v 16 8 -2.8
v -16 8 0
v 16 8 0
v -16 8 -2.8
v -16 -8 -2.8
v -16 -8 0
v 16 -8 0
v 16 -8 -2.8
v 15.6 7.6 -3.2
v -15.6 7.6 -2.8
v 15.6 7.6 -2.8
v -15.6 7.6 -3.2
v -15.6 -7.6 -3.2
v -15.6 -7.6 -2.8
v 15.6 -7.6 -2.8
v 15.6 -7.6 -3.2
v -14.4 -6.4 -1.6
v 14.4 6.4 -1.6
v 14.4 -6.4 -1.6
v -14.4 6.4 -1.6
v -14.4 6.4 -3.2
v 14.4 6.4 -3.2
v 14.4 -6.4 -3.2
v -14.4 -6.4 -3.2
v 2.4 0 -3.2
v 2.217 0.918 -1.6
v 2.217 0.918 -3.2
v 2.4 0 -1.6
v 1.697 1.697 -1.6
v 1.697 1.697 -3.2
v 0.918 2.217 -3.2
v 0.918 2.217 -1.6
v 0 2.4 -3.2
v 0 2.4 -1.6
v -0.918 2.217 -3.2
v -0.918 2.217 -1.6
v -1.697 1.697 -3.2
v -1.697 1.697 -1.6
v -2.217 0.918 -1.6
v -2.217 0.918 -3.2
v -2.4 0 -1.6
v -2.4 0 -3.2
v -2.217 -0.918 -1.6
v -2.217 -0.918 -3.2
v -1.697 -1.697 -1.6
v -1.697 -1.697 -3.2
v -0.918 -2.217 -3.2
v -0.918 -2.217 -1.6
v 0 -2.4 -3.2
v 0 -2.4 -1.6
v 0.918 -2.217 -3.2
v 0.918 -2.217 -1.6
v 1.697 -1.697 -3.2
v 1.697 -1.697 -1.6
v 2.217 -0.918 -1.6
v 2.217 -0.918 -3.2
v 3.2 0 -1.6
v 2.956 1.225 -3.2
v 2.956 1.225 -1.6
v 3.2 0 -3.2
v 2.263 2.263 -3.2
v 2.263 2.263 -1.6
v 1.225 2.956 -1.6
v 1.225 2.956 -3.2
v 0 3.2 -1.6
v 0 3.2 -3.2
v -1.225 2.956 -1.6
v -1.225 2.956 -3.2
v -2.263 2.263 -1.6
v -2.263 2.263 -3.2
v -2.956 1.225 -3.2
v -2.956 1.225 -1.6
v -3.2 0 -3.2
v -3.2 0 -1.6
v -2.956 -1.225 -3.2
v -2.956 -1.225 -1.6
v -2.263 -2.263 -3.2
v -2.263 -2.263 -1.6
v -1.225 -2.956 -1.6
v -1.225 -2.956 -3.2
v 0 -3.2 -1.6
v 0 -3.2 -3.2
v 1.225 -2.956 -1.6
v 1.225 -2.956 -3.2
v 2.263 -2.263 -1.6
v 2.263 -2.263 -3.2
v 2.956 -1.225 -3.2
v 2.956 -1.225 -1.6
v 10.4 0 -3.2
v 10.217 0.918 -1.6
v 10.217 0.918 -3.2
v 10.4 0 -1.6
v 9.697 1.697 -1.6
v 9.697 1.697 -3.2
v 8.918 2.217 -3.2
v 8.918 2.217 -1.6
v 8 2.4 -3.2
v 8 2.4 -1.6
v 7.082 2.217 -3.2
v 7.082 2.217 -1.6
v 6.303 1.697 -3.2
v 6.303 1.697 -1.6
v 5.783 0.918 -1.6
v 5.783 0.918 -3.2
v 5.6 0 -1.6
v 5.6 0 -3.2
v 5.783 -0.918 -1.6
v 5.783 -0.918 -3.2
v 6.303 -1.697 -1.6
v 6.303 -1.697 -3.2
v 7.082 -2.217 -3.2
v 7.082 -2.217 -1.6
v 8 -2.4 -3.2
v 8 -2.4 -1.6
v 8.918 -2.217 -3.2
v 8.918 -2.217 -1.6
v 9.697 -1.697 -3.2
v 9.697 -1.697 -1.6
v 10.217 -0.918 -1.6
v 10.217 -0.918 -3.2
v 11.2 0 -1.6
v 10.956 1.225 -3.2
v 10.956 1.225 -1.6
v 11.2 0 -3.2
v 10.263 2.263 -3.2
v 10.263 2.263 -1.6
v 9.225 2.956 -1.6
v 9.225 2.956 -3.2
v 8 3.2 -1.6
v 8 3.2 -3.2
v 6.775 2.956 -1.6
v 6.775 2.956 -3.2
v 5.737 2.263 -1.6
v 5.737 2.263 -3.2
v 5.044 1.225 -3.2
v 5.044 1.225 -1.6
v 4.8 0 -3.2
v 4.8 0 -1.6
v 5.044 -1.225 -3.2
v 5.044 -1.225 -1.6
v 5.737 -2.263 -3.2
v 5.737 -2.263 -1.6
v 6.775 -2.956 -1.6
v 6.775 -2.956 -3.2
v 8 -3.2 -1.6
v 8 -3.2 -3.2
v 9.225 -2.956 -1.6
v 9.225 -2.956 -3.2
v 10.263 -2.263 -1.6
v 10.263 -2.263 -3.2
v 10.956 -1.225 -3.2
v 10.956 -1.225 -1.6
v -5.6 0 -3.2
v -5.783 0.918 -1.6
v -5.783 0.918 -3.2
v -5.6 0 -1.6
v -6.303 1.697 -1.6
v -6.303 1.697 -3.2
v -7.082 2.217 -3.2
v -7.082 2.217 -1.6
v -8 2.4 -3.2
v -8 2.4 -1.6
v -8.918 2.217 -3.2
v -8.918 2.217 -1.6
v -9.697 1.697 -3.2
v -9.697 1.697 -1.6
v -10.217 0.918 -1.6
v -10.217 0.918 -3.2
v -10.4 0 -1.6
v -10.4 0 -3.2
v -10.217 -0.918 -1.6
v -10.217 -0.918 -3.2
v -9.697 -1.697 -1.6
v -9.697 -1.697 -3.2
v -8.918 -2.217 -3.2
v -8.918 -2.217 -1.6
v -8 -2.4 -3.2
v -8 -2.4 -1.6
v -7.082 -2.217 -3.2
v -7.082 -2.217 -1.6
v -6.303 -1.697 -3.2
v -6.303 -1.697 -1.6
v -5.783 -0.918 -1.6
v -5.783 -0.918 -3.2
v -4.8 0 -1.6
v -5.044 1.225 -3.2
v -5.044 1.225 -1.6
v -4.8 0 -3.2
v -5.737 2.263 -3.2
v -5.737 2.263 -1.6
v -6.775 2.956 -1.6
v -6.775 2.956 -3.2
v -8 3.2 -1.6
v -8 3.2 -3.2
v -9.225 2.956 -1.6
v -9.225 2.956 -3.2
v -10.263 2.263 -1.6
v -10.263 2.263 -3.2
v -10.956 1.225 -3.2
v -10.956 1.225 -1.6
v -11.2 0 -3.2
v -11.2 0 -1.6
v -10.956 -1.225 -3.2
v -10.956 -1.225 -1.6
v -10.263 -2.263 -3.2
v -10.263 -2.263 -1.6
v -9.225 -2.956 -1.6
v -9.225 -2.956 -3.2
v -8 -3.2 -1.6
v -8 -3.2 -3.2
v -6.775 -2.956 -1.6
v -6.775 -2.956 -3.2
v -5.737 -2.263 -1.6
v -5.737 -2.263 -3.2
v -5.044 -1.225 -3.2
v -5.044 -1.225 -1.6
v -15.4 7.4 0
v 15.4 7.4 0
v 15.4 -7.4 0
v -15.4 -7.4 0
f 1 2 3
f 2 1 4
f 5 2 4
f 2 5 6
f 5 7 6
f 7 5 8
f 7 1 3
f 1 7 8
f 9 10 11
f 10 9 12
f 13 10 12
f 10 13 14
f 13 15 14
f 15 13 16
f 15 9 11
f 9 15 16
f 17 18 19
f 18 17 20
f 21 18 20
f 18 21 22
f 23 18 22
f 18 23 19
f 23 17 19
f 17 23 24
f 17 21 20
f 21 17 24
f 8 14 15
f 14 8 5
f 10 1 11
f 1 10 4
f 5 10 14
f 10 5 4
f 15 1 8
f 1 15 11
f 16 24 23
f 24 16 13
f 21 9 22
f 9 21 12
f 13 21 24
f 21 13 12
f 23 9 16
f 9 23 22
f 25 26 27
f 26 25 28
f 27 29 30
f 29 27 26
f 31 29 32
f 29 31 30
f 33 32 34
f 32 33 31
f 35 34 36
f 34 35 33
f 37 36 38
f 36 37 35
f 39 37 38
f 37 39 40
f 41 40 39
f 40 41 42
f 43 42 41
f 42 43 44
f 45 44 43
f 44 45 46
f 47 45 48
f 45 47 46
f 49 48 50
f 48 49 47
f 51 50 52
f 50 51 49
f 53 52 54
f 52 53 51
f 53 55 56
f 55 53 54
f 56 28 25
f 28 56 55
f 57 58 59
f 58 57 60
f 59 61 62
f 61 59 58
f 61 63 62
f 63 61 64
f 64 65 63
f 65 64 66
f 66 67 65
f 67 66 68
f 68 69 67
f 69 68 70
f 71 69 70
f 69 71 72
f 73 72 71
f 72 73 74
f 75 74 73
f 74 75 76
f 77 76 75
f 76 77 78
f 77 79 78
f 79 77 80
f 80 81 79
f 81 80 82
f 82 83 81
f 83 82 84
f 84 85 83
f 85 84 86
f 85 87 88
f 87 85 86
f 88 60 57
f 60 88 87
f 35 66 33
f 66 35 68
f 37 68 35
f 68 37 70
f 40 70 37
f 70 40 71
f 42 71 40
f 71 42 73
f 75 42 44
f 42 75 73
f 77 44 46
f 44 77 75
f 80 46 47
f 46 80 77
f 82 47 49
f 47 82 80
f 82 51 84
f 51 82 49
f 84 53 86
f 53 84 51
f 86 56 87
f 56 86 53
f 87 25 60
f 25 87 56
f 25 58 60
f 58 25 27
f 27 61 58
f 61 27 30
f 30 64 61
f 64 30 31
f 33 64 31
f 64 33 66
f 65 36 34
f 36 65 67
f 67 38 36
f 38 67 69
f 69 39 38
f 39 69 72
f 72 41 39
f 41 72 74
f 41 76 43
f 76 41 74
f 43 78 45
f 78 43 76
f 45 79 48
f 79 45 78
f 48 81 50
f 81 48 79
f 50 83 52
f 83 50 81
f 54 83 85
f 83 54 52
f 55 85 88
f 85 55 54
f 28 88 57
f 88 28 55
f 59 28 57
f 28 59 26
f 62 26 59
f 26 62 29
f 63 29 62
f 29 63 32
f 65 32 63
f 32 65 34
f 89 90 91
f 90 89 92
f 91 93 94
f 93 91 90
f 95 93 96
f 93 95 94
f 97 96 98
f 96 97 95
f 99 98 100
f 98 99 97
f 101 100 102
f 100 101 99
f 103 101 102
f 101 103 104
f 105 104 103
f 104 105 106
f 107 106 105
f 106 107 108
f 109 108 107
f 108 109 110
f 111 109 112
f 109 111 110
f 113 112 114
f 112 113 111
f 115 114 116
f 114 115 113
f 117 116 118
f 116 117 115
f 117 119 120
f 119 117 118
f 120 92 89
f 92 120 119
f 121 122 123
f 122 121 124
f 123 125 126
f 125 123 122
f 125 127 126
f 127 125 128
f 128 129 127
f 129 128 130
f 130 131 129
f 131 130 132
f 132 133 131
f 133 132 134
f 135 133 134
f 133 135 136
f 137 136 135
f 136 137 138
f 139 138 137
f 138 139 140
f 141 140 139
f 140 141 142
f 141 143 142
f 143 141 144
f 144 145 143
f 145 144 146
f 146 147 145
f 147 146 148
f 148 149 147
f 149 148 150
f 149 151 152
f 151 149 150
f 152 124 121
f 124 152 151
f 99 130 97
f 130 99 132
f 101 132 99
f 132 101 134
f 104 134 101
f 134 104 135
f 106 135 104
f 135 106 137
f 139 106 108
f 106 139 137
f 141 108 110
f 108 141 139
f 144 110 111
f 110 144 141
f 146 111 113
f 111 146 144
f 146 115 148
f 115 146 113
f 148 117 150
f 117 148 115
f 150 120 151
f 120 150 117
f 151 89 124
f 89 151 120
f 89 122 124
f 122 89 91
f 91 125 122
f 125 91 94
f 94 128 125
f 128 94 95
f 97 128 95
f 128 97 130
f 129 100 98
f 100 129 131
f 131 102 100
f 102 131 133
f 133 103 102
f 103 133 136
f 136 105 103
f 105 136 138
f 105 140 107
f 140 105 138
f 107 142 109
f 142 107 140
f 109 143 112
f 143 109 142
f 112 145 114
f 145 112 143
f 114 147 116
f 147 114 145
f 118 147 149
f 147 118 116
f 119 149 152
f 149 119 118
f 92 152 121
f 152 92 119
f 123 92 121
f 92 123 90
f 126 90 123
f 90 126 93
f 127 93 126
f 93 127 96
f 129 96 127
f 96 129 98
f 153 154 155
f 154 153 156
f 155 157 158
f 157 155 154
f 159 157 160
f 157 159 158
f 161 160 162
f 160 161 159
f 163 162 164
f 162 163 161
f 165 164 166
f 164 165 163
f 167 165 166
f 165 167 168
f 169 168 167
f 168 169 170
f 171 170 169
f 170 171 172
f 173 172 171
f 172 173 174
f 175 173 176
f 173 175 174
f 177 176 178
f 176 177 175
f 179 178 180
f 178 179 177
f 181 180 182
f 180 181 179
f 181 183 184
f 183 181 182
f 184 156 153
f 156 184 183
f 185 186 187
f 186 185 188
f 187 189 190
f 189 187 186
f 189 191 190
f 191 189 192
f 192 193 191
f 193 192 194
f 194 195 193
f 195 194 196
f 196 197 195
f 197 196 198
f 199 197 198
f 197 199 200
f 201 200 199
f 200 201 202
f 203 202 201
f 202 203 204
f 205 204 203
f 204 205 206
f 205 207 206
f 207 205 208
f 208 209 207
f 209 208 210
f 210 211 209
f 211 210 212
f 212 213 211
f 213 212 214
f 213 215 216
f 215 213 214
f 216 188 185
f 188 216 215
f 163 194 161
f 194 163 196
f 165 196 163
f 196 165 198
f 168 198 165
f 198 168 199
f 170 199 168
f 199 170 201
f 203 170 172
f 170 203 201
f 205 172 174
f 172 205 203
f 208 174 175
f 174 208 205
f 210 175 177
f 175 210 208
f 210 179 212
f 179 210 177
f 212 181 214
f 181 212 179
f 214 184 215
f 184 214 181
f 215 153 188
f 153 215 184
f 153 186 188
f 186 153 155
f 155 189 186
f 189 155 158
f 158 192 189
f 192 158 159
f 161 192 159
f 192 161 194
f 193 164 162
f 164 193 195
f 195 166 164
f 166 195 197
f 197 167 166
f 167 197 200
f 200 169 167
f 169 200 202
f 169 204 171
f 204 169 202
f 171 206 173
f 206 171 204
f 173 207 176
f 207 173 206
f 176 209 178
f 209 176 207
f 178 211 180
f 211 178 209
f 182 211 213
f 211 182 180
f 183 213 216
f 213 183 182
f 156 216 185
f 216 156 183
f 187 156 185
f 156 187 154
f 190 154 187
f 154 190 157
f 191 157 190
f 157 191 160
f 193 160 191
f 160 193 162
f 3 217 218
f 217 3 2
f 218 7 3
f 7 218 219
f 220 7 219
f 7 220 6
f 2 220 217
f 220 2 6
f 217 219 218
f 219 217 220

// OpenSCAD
// file: ../p/4-4ring3.scad
use <../lib.scad>
$fa=1; $fs=0.2;
function ldraw_lib__4_4ring3(realsolid=false) = [
// 0 Ring  3 x 1.0
// 0 Name: 4-4ring3.dat
// 0 Author: James Jessiman
// 0 !LDRAW_ORG Primitive UPDATE 2009-01
// 0 !LICENSE Licensed under CC BY 2.0 and CC BY 4.0 : see CAreadme.txt
// 
// 0 BFC CERTIFY CCW
  [0,"BFC","CERTIFY"],
  [0,"BFC","CCW"],
// 
// 0 !HISTORY 1998-12-15 [PTadmin] Official Update 1998-10
// 0 !HISTORY 2002-04-05 [hafhead] Added BFC statement
// 0 !HISTORY 2002-04-25 [PTadmin] Official Update 2002-02
// 0 !HISTORY 2007-06-24 [PTadmin] Header formatted for Contributor Agreement
// 0 !HISTORY 2008-07-01 [PTadmin] Official Update 2008-01
// 0 !HISTORY 2008-08-26 [cwdee] Switch polygon winding and rename
// 0 !HISTORY 2009-05-02 [PTadmin] Official Update 2009-01
// 
// 
// 4 16 -1.5308 0 3.6956 -1.1481 0 2.7717 0 0 3 0 0 4
  [4,16,-1.5308,0,3.6956,-1.1481,0,2.7717,0,0,3,0,0,4],
// 4 16 -2.8284 0 2.8284 -2.1213 0 2.1213 -1.1481 0 2.7717 -1.5308 0 3.6956
  [4,16,-2.8284,0,2.8284,-2.1213,0,2.1213,-1.1481,0,2.7717,-1.5308,0,3.6956],
// 4 16 -3.6956 0 1.5308 -2.7717 0 1.1481 -2.1213 0 2.1213 -2.8284 0 2.8284
  [4,16,-3.6956,0,1.5308,-2.7717,0,1.1481,-2.1213,0,2.1213,-2.8284,0,2.8284],
// 4 16 -4 0 0 -3 0 0 -2.7717 0 1.1481 -3.6956 0 1.5308
  [4,16,-4,0,0,-3,0,0,-2.7717,0,1.1481,-3.6956,0,1.5308],
// 4 16 -3.6956 0 -1.5308 -2.7717 0 -1.1481 -3 0 0 -4 0 0
  [4,16,-3.6956,0,-1.5308,-2.7717,0,-1.1481,-3,0,0,-4,0,0],
// 4 16 -2.8284 0 -2.8284 -2.1213 0 -2.1213 -2.7717 0 -1.1481 -3.6956 0 -1.5308
  [4,16,-2.8284,0,-2.8284,-2.1213,0,-2.1213,-2.7717,0,-1.1481,-3.6956,0,-1.5308],
// 4 16 -1.5308 0 -3.6956 -1.1481 0 -2.7717 -2.1213 0 -2.1213 -2.8284 0 -2.8284
  [4,16,-1.5308,0,-3.6956,-1.1481,0,-2.7717,-2.1213,0,-2.1213,-2.8284,0,-2.8284],
// 4 16 0 0 -4 0 0 -3 -1.1481 0 -2.7717 -1.5308 0 -3.6956
  [4,16,0,0,-4,0,0,-3,-1.1481,0,-2.7717,-1.5308,0,-3.6956],
// 4 16 1.5308 0 -3.6956 1.1481 0 -2.7717 0 0 -3 0 0 -4
  [4,16,1.5308,0,-3.6956,1.1481,0,-2.7717,0,0,-3,0,0,-4],
// 4 16 2.8284 0 -2.8284 2.1213 0 -2.1213 1.1481 0 -2.7717 1.5308 0 -3.6956
  [4,16,2.8284,0,-2.8284,2.1213,0,-2.1213,1.1481,0,-2.7717,1.5308,0,-3.6956],
// 4 16 3.6956 0 -1.5308 2.7717 0 -1.1481 2.1213 0 -2.1213 2.8284 0 -2.8284
  [4,16,3.6956,0,-1.5308,2.7717,0,-1.1481,2.1213,0,-2.1213,2.8284,0,-2.8284],
// 4 16 4 0 0 3 0 0 2.7717 0 -1.1481 3.6956 0 -1.5308
  [4,16,4,0,0,3,0,0,2.7717,0,-1.1481,3.6956,0,-1.5308],
// 4 16 3.6956 0 1.5308 2.7717 0 1.1481 3 0 0 4 0 0
  [4,16,3.6956,0,1.5308,2.7717,0,1.1481,3,0,0,4,0,0],
// 4 16 2.8284 0 2.8284 2.1213 0 2.1213 2.7717 0 1.1481 3.6956 0 1.5308
  [4,16,2.8284,0,2.8284,2.1213,0,2.1213,2.7717,0,1.1481,3.6956,0,1.5308],
// 4 16 1.5308 0 3.6956 1.1481 0 2.7717 2.1213 0 2.1213 2.8284 0 2.8284
  [4,16,1.5308,0,3.6956,1.1481,0,2.7717,2.1213,0,2.1213,2.8284,0,2.8284],
// 4 16 0 0 4 0 0 3 1.1481 0 2.7717 1.5308 0 3.6956
  [4,16,0,0,4,0,0,3,1.1481,0,2.7717,1.5308,0,3.6956],
// 0
];
module ldraw_lib__4_4ring3(step=0, col=false, unit=2/5, alt=false, line=0.2, solid=!$preview)
    makepoly(ldraw_lib__4_4ring3(solid), step=step, col=col, unit=unit, alt=alt, line=line, solid=solid);
ldraw_lib__4_4ring3(line=0.2);
// file: ../p/4-4edge.scad
use <../lib.scad>
function ldraw_lib__4_4edge() = [
// 0 Circle 1.0
// 0 Name: 4-4edge.dat
// 0 Author: James Jessiman
// 0 !LDRAW_ORG Primitive UPDATE 2017-01
// 0 !LICENSE Licensed under CC BY 2.0 and CC BY 4.0 : see CAreadme.txt
// 
// 0 BFC CERTIFY CCW
  [0,"BFC","CERTIFY"],
  [0,"BFC","CCW"],
// 
// 0 !HISTORY 1998-12-15 [PTadmin] Official Update 1998-10
// 0 !HISTORY 2005-12-28 [PTadmin] Official Update 2005-01
// 0 !HISTORY 2007-06-24 [PTadmin] Header formatted for Contributor Agreement
// 0 !HISTORY 2008-07-01 [PTadmin] Official Update 2008-01
// 0 !HISTORY 2017-01-15 [Steffen] BFCed
// 0 !HISTORY 2017-12-30 [PTadmin] Official Update 2017-01
// 
// 
// 2 24 1 0 0 0.9239 0 0.3827
  [2,24,1,0,0,0.9239,0,0.3827],
// 2 24 0.9239 0 0.3827 0.7071 0 0.7071
  [2,24,0.9239,0,0.3827,0.7071,0,0.7071],
// 2 24 0.7071 0 0.7071 0.3827 0 0.9239
  [2,24,0.7071,0,0.7071,0.3827,0,0.9239],
// 2 24 0.3827 0 0.9239 0 0 1
  [2,24,0.3827,0,0.9239,0,0,1],
// 2 24 0 0 1 -0.3827 0 0.9239
  [2,24,0,0,1,-0.3827,0,0.9239],
// 2 24 -0.3827 0 0.9239 -0.7071 0 0.7071
  [2,24,-0.3827,0,0.9239,-0.7071,0,0.7071],
// 2 24 -0.7071 0 0.7071 -0.9239 0 0.3827
  [2,24,-0.7071,0,0.7071,-0.9239,0,0.3827],
// 2 24 -0.9239 0 0.3827 -1 0 -0
  [2,24,-0.9239,0,0.3827,-1,0,-0],
// 2 24 -1 0 -0 -0.9239 0 -0.3827
  [2,24,-1,0,-0,-0.9239,0,-0.3827],
// 2 24 -0.9239 0 -0.3827 -0.7071 0 -0.7071
  [2,24,-0.9239,0,-0.3827,-0.7071,0,-0.7071],
// 2 24 -0.7071 0 -0.7071 -0.3827 0 -0.9239
  [2,24,-0.7071,0,-0.7071,-0.3827,0,-0.9239],
// 2 24 -0.3827 0 -0.9239 0 0 -1
  [2,24,-0.3827,0,-0.9239,0,0,-1],
// 2 24 0 0 -1 0.3827 0 -0.9239
  [2,24,0,0,-1,0.3827,0,-0.9239],
// 2 24 0.3827 0 -0.9239 0.7071 0 -0.7071
  [2,24,0.3827,0,-0.9239,0.7071,0,-0.7071],
// 2 24 0.7071 0 -0.7071 0.9239 0 -0.3827
  [2,24,0.7071,0,-0.7071,0.9239,0,-0.3827],
// 2 24 0.9239 0 -0.3827 1 0 0
  [2,24,0.9239,0,-0.3827,1,0,0],
];
module ldraw_lib__4_4edge(step=0, col=false, unit=2/5, alt=false, line=0.2, solid=!$preview)
    makepoly(ldraw_lib__4_4edge(), step=step, col=col, unit=unit, alt=alt, line=line, solid=solid);
ldraw_lib__4_4edge(line=0.2);
// file: ../p/4-4cyli.scad
use <../lib.scad>
$fa=1; $fs=0.2;
function ldraw_lib__4_4cyli(realsolid=false) = [
// 0 Cylinder 1.0
// 0 Name: 4-4cyli.dat
// 0 Author: James Jessiman
// 0 !LDRAW_ORG Primitive UPDATE 2005-01
// 0 !LICENSE Licensed under CC BY 2.0 and CC BY 4.0 : see CAreadme.txt
// 
// 0 BFC CERTIFY CCW
  [0,"BFC","CERTIFY"],
  [0,"BFC","CCW"],
// 
// 0 !HISTORY 1998-12-15 [PTadmin] Official Update 1998-10
// 0 !HISTORY 2002-03-23 [sbliss] Added BFC statement; merged headers from files in distributions LDraw 0.27 and Complete.
// 0 !HISTORY 2002-04-25 [PTadmin] Official Update 2002-02
// 0 !HISTORY 2004-12-14 [guyvivan] BFC CCW
// 0 !HISTORY 2005-12-28 [PTadmin] Official Update 2005-01
// 0 !HISTORY 2007-06-24 [PTadmin] Header formatted for Contributor Agreement
// 0 !HISTORY 2008-07-01 [PTadmin] Official Update 2008-01
// 
// 
// 4 16 1 1 0 0.9239 1 0.3827 0.9239 0 0.3827 1 0 0
  [4,16,1,1,0,0.9239,1,0.3827,0.9239,0,0.3827,1,0,0],
// 5 24 1 0 0 1 1 0 0.9239 0 0.3827 0.9239 0 -0.3827
  [5,24,1,0,0,1,1,0,0.9239,0,0.3827,0.9239,0,-0.3827],
// 4 16 0.9239 1 0.3827 0.7071 1 0.7071 0.7071 0 0.7071 0.9239 0 0.3827
  [4,16,0.9239,1,0.3827,0.7071,1,0.7071,0.7071,0,0.7071,0.9239,0,0.3827],
// 5 24 0.9239 0 0.3827 0.9239 1 0.3827 0.7071 0 0.7071 1 0 0
  [5,24,0.9239,0,0.3827,0.9239,1,0.3827,0.7071,0,0.7071,1,0,0],
// 4 16 0.7071 1 0.7071 0.3827 1 0.9239 0.3827 0 0.9239 0.7071 0 0.7071
  [4,16,0.7071,1,0.7071,0.3827,1,0.9239,0.3827,0,0.9239,0.7071,0,0.7071],
// 5 24 0.7071 0 0.7071 0.7071 1 0.7071 0.3827 0 0.9239 0.9239 0 0.3827
  [5,24,0.7071,0,0.7071,0.7071,1,0.7071,0.3827,0,0.9239,0.9239,0,0.3827],
// 4 16 0.3827 1 0.9239 0 1 1 0 0 1 0.3827 0 0.9239
  [4,16,0.3827,1,0.9239,0,1,1,0,0,1,0.3827,0,0.9239],
// 5 24 0.3827 0 0.9239 0.3827 1 0.9239 0 0 1 0.7071 0 0.7071
  [5,24,0.3827,0,0.9239,0.3827,1,0.9239,0,0,1,0.7071,0,0.7071],
// 4 16 0 1 1 -0.3827 1 0.9239 -0.3827 0 0.9239 0 0 1
  [4,16,0,1,1,-0.3827,1,0.9239,-0.3827,0,0.9239,0,0,1],
// 5 24 0 0 1 0 1 1 -0.3827 0 0.9239 0.3827 0 0.9239
  [5,24,0,0,1,0,1,1,-0.3827,0,0.9239,0.3827,0,0.9239],
// 4 16 -0.3827 1 0.9239 -0.7071 1 0.7071 -0.7071 0 0.7071 -0.3827 0 0.9239
  [4,16,-0.3827,1,0.9239,-0.7071,1,0.7071,-0.7071,0,0.7071,-0.3827,0,0.9239],
// 5 24 -0.3827 0 0.9239 -0.3827 1 0.9239 -0.7071 0 0.7071 0 0 1
  [5,24,-0.3827,0,0.9239,-0.3827,1,0.9239,-0.7071,0,0.7071,0,0,1],
// 4 16 -0.7071 1 0.7071 -0.9239 1 0.3827 -0.9239 0 0.3827 -0.7071 0 0.7071
  [4,16,-0.7071,1,0.7071,-0.9239,1,0.3827,-0.9239,0,0.3827,-0.7071,0,0.7071],
// 5 24 -0.7071 0 0.7071 -0.7071 1 0.7071 -0.9239 0 0.3827 -0.3827 0 0.9239
  [5,24,-0.7071,0,0.7071,-0.7071,1,0.7071,-0.9239,0,0.3827,-0.3827,0,0.9239],
// 4 16 -0.9239 1 0.3827 -1 1 0 -1 0 0 -0.9239 0 0.3827
  [4,16,-0.9239,1,0.3827,-1,1,0,-1,0,0,-0.9239,0,0.3827],
// 5 24 -0.9239 0 0.3827 -0.9239 1 0.3827 -1 0 0 -0.7071 0 0.7071
  [5,24,-0.9239,0,0.3827,-0.9239,1,0.3827,-1,0,0,-0.7071,0,0.7071],
// 4 16 -1 1 0 -0.9239 1 -0.3827 -0.9239 0 -0.3827 -1 0 0
  [4,16,-1,1,0,-0.9239,1,-0.3827,-0.9239,0,-0.3827,-1,0,0],
// 5 24 -1 0 0 -1 1 0 -0.9239 0 -0.3827 -0.9239 0 0.3827
  [5,24,-1,0,0,-1,1,0,-0.9239,0,-0.3827,-0.9239,0,0.3827],
// 4 16 -0.9239 1 -0.3827 -0.7071 1 -0.7071 -0.7071 0 -0.7071 -0.9239 0 -0.3827
  [4,16,-0.9239,1,-0.3827,-0.7071,1,-0.7071,-0.7071,0,-0.7071,-0.9239,0,-0.3827],
// 5 24 -0.9239 0 -0.3827 -0.9239 1 -0.3827 -0.7071 0 -0.7071 -1 0 0
  [5,24,-0.9239,0,-0.3827,-0.9239,1,-0.3827,-0.7071,0,-0.7071,-1,0,0],
// 4 16 -0.7071 1 -0.7071 -0.3827 1 -0.9239 -0.3827 0 -0.9239 -0.7071 0 -0.7071
  [4,16,-0.7071,1,-0.7071,-0.3827,1,-0.9239,-0.3827,0,-0.9239,-0.7071,0,-0.7071],
// 5 24 -0.7071 0 -0.7071 -0.7071 1 -0.7071 -0.3827 0 -0.9239 -0.9239 0 -0.3827
  [5,24,-0.7071,0,-0.7071,-0.7071,1,-0.7071,-0.3827,0,-0.9239,-0.9239,0,-0.3827],
// 4 16 -0.3827 1 -0.9239 0 1 -1 0 0 -1 -0.3827 0 -0.9239
  [4,16,-0.3827,1,-0.9239,0,1,-1,0,0,-1,-0.3827,0,-0.9239],
// 5 24 -0.3827 0 -0.9239 -0.3827 1 -0.9239 0 0 -1 -0.7071 0 -0.7071
  [5,24,-0.3827,0,-0.9239,-0.3827,1,-0.9239,0,0,-1,-0.7071,0,-0.7071],
// 4 16 0 1 -1 0.3827 1 -0.9239 0.3827 0 -0.9239 0 0 -1
  [4,16,0,1,-1,0.3827,1,-0.9239,0.3827,0,-0.9239,0,0,-1],
// 5 24 0 0 -1 0 1 -1 0.3827 0 -0.9239 -0.3827 0 -0.9239
  [5,24,0,0,-1,0,1,-1,0.3827,0,-0.9239,-0.3827,0,-0.9239],
// 4 16 0.3827 1 -0.9239 0.7071 1 -0.7071 0.7071 0 -0.7071 0.3827 0 -0.9239
  [4,16,0.3827,1,-0.9239,0.7071,1,-0.7071,0.7071,0,-0.7071,0.3827,0,-0.9239],
// 5 24 0.3827 0 -0.9239 0.3827 1 -0.9239 0.7071 0 -0.7071 0 0 -1
  [5,24,0.3827,0,-0.9239,0.3827,1,-0.9239,0.7071,0,-0.7071,0,0,-1],
// 4 16 0.7071 1 -0.7071 0.9239 1 -0.3827 0.9239 0 -0.3827 0.7071 0 -0.7071
  [4,16,0.7071,1,-0.7071,0.9239,1,-0.3827,0.9239,0,-0.3827,0.7071,0,-0.7071],
// 5 24 0.7071 0 -0.7071 0.7071 1 -0.7071 0.9239 0 -0.3827 0.3827 0 -0.9239
  [5,24,0.7071,0,-0.7071,0.7071,1,-0.7071,0.9239,0,-0.3827,0.3827,0,-0.9239],
// 4 16 0.9239 1 -0.3827 1 1 0 1 0 0 0.9239 0 -0.3827
  [4,16,0.9239,1,-0.3827,1,1,0,1,0,0,0.9239,0,-0.3827],
// 5 24 0.9239 0 -0.3827 0.9239 1 -0.3827 1 0 0 0.7071 0 -0.7071
  [5,24,0.9239,0,-0.3827,0.9239,1,-0.3827,1,0,0,0.7071,0,-0.7071],
// 0
];
module ldraw_lib__4_4cyli(step=0, col=false, unit=2/5, alt=false, line=0.2, solid=!$preview)
    makepoly(ldraw_lib__4_4cyli(solid), step=step, col=col, unit=unit, alt=alt, line=line, solid=solid);
ldraw_lib__4_4cyli(line=0.2);
// file: ../p/stud4.scad
use <../lib.scad>
use <4-4cyli.scad>
use <4-4edge.scad>
use <4-4ring3.scad>
function ldraw_lib__stud4() = [
// 0 Stud Tube Open
// 0 Name: stud4.dat
// 0 Author: James Jessiman
// 0 !LDRAW_ORG Primitive UPDATE 2009-02
// 0 !LICENSE Licensed under CC BY 4.0 : see CAreadme.txt
// 
// 0 BFC CERTIFY CCW
  [0,"BFC","CERTIFY"],
  [0,"BFC","CCW"],
// 
// 0 !HISTORY 1999-07-05 [PTadmin] Official Update 1999-05
// 0 !HISTORY 2002-04-04 [sbliss] Modified for BFC compliance
// 0 !HISTORY 2002-04-25 [PTadmin] Official Update 2002-02
// 0 !HISTORY 2007-06-24 [PTadmin] Header formatted for Contributor Agreement
// 0 !HISTORY 2008-07-01 [PTadmin] Official Update 2008-01
// 0 !HISTORY 2009-06-21 [cwdee] Update ring references to 4-4ring
// 0 !HISTORY 2009-09-03 [PTadmin] Official Update 2009-02
// 
// 
// 1 16 0 -4 0 6 0 0 0 1 0 0 0 6 4-4edge.dat
  [1,16,0,-4,0,6,0,0,0,1,0,0,0,6, ldraw_lib__4_4edge()],
// 1 16 0 -4 0 8 0 0 0 1 0 0 0 8 4-4edge.dat
  [1,16,0,-4,0,8,0,0,0,1,0,0,0,8, ldraw_lib__4_4edge()],
// 1 16 0 0 0 6 0 0 0 1 0 0 0 6 4-4edge.dat
  [1,16,0,0,0,6,0,0,0,1,0,0,0,6, ldraw_lib__4_4edge()],
// 1 16 0 0 0 8 0 0 0 1 0 0 0 8 4-4edge.dat
  [1,16,0,0,0,8,0,0,0,1,0,0,0,8, ldraw_lib__4_4edge()],
// 0 BFC INVERTNEXT
  [0,"BFC","INVERTNEXT"],
// 1 16 0 -4 0 6 0 0 0 4 0 0 0 6 4-4cyli.dat
  [1,16,0,-4,0,6,0,0,0,4,0,0,0,6, ldraw_lib__4_4cyli()],
// 1 16 0 -4 0 8 0 0 0 4 0 0 0 8 4-4cyli.dat
  [1,16,0,-4,0,8,0,0,0,4,0,0,0,8, ldraw_lib__4_4cyli()],
// 1 16 0 -4 0 2 0 0 0 1 0 0 0 2 4-4ring3.dat
  [1,16,0,-4,0,2,0,0,0,1,0,0,0,2, ldraw_lib__4_4ring3()],
  [-1,16,0,0,0,2,0,0,0,-1,0,0,0,2, ldraw_lib__4_4ring3()],
// 0
];
module ldraw_lib__stud4(step=0, col=false, unit=2/5, alt=false, line=0.2, solid=!$preview)
    makepoly(ldraw_lib__stud4(), step=step, col=col, unit=unit, alt=alt, line=line, solid=solid);
ldraw_lib__stud4(line=0.2);
// file: ../p/box5.scad
use <../lib.scad>
function ldraw_lib__box5() = [
// 0 Box with 5 Faces and All Edges
// 0 Name: box5.dat
// 0 Author: James Jessiman
// 0 !LDRAW_ORG Primitive UPDATE 2012-01
// 0 !LICENSE Licensed under CC BY 2.0 and CC BY 4.0 : see CAreadme.txt
// 
// 0 BFC CERTIFY CCW
  [0,"BFC","CERTIFY"],
  [0,"BFC","CCW"],
// 
// 0 !HISTORY 2002-04-03 [sbliss] Modified for BFC compliance
// 0 !HISTORY 2002-04-25 [PTadmin] Official Update 2002-02
// 0 !HISTORY 2007-06-24 [PTadmin] Header formatted for Contributor Agreement
// 0 !HISTORY 2008-07-01 [PTadmin] Official Update 2008-01
// 0 !HISTORY 2012-02-16 [Philo] Changed to CCW
// 0 !HISTORY 2012-03-30 [PTadmin] Official Update 2012-01
// 
// 
// 2 24 1 1 1 -1 1 1
  [2,24,1,1,1,-1,1,1],
// 2 24 -1 1 1 -1 1 -1
  [2,24,-1,1,1,-1,1,-1],
// 2 24 -1 1 -1 1 1 -1
  [2,24,-1,1,-1,1,1,-1],
// 2 24 1 1 -1 1 1 1
  [2,24,1,1,-1,1,1,1],
// 2 24 1 0 1 -1 0 1
  [2,24,1,0,1,-1,0,1],
// 2 24 -1 0 1 -1 0 -1
  [2,24,-1,0,1,-1,0,-1],
// 2 24 -1 0 -1 1 0 -1
  [2,24,-1,0,-1,1,0,-1],
// 2 24 1 0 -1 1 0 1
  [2,24,1,0,-1,1,0,1],
// 2 24 1 0 1 1 1 1
  [2,24,1,0,1,1,1,1],
// 2 24 -1 0 1 -1 1 1
  [2,24,-1,0,1,-1,1,1],
// 2 24 1 0 -1 1 1 -1
  [2,24,1,0,-1,1,1,-1],
// 2 24 -1 0 -1 -1 1 -1
  [2,24,-1,0,-1,-1,1,-1],
// 4 16 -1 1 1 1 1 1 1 1 -1 -1 1 -1
  [4,16,-1,1,1,1,1,1,1,1,-1,-1,1,-1],
// 4 16 -1 1 1 -1 0 1 1 0 1 1 1 1
  [4,16,-1,1,1,-1,0,1,1,0,1,1,1,1],
// 4 16 -1 1 -1 -1 0 -1 -1 0 1 -1 1 1
  [4,16,-1,1,-1,-1,0,-1,-1,0,1,-1,1,1],
// 4 16 1 1 -1 1 0 -1 -1 0 -1 -1 1 -1
  [4,16,1,1,-1,1,0,-1,-1,0,-1,-1,1,-1],
// 4 16 1 1 1 1 0 1 1 0 -1 1 1 -1
  [4,16,1,1,1,1,0,1,1,0,-1,1,1,-1],
];
makepoly(ldraw_lib__box5(), line=0.2);
// file: ../p/box4.scad
use <../lib.scad>
function ldraw_lib__box4() = [
// 0 Box with 4 Faces (2 Parallel Pairs) and All Edges
// 0 Name: box4.dat
// 0 Author: James Jessiman
// 0 !LDRAW_ORG Primitive UPDATE 2012-01
// 0 !LICENSE Licensed under CC BY 4.0 : see CAreadme.txt
// 
// 0 BFC CERTIFY CCW
  [0,"BFC","CERTIFY"],
  [0,"BFC","CCW"],
// 
// 0 !HISTORY 2002-04-03 [sbliss] Modified for BFC compliance
// 0 !HISTORY 2002-04-25 [PTadmin] Official Update 2002-02
// 0 !HISTORY 2007-06-24 [PTadmin] Header formatted for Contributor Agreement
// 0 !HISTORY 2008-07-01 [PTadmin] Official Update 2008-01
// 0 !HISTORY 2012-02-16 [Philo] Changed to CCW
// 0 !HISTORY 2012-03-30 [PTadmin] Official Update 2012-01
// 
// 
// 2 24 1 1 1 -1 1 1
  [2,24,1,1,1,-1,1,1],
// 2 24 -1 1 1 -1 1 -1
  [2,24,-1,1,1,-1,1,-1],
// 2 24 -1 1 -1 1 1 -1
  [2,24,-1,1,-1,1,1,-1],
// 2 24 1 1 -1 1 1 1
  [2,24,1,1,-1,1,1,1],
// 2 24 1 0 1 -1 0 1
  [2,24,1,0,1,-1,0,1],
// 2 24 -1 0 1 -1 0 -1
  [2,24,-1,0,1,-1,0,-1],
// 2 24 -1 0 -1 1 0 -1
  [2,24,-1,0,-1,1,0,-1],
// 2 24 1 0 -1 1 0 1
  [2,24,1,0,-1,1,0,1],
// 2 24 1 0 1 1 1 1
  [2,24,1,0,1,1,1,1],
// 2 24 -1 0 1 -1 1 1
  [2,24,-1,0,1,-1,1,1],
// 2 24 1 0 -1 1 1 -1
  [2,24,1,0,-1,1,1,-1],
// 2 24 -1 0 -1 -1 1 -1
  [2,24,-1,0,-1,-1,1,-1],
// 4 16 -1 1 1 -1 0 1 1 0 1 1 1 1
  [4,16,-1,1,1,-1,0,1,1,0,1,1,1,1],
// 4 16 -1 1 -1 -1 0 -1 -1 0 1 -1 1 1
  [4,16,-1,1,-1,-1,0,-1,-1,0,1,-1,1,1],
// 4 16 1 1 -1 1 0 -1 -1 0 -1 -1 1 -1
  [4,16,1,1,-1,1,0,-1,-1,0,-1,-1,1,-1],
// 4 16 1 1 1 1 0 1 1 0 -1 1 1 -1
  [4,16,1,1,1,1,0,1,1,0,-1,1,1,-1],
];
module ldraw_lib__box4(step=0, col=false, unit=2/5, alt=false, line=0.2, solid=!$preview)
    makepoly(ldraw_lib__box4(), step=step, col=col, unit=unit, alt=alt, line=line, solid=solid);
ldraw_lib__box4(line=0.2);
// file: s/87079s01.scad
use <../../lib.scad>
use <../../p/box4.scad>
use <../../p/box5.scad>
use <../../p/stud4.scad>
function ldraw_lib__s__87079s01() = [
// 0 ~Tile  2 x  4 without Top Surface
// 0 Name: s\87079s01.dat
// 0 Author: Philippe Hurbain [Philo]
// 0 !LDRAW_ORG Subpart UPDATE 2025-04
// 0 !LICENSE Licensed under CC BY 4.0 : see CAreadme.txt
// 
// 0 BFC CERTIFY CCW
  [0,"BFC","CERTIFY"],
  [0,"BFC","CCW"],
// 
// 0 !HISTORY 2012-09-30 [Philo] Subparted from Tim Gould's original design
// 0 !HISTORY 2012-12-28 [PTadmin] Official Update 2012-03
// 0 !HISTORY 2025-04-25 [MagFors] Update description
// 0 !HISTORY 2025-04-27 [OrionP] Official Update 2025-04
// 
// 1 16 0 0 0 40 0 0 0 7 0 0 0 20 box4.dat
  [1,16,0,0,0,40,0,0,0,7,0,0,0,20, ldraw_lib__box4()],
// 1 16 0 7 0 39 0 0 0 1 0 0 0 19 box4.dat
  [1,16,0,7,0,39,0,0,0,1,0,0,0,19, ldraw_lib__box4()],
// 0 BFC INVERTNEXT
  [0,"BFC","INVERTNEXT"],
// 1 16 0 8 0 -36 0 0 0 -4 0 0 0 16 box5.dat
  [1,16,0,8,0,-36,0,0,0,-4,0,0,0,16, ldraw_lib__box5()],
// 4 16 -40 7 -20 -39 7 -19 39 7 -19 40 7 -20
  [4,16,-40,7,-20,-39,7,-19,39,7,-19,40,7,-20],
// 4 16 40 7 20 39 7 19 -39 7 19 -40 7 20
  [4,16,40,7,20,39,7,19,-39,7,19,-40,7,20],
// 4 16 -40 7 -20 -40 7 20 -39 7 19 -39 7 -19
  [4,16,-40,7,-20,-40,7,20,-39,7,19,-39,7,-19],
// 4 16 40 7 20 40 7 -20 39 7 -19 39 7 19
  [4,16,40,7,20,40,7,-20,39,7,-19,39,7,19],
// 4 16 -39 8 -19 -36 8 -16 36 8 -16 39 8 -19
  [4,16,-39,8,-19,-36,8,-16,36,8,-16,39,8,-19],
// 4 16 39 8 19 36 8 16 -36 8 16 -39 8 19
  [4,16,39,8,19,36,8,16,-36,8,16,-39,8,19],
// 4 16 -39 8 -19 -39 8 19 -36 8 16 -36 8 -16
  [4,16,-39,8,-19,-39,8,19,-36,8,16,-36,8,-16],
// 4 16 39 8 19 39 8 -19 36 8 -16 36 8 16
  [4,16,39,8,19,39,8,-19,36,8,-16,36,8,16],
// 1 16 0 4 0 1 0 0 0 -1 0 0 0 1 stud4.dat
  [1,16,0,4,0,1,0,0,0,-1,0,0,0,1, ldraw_lib__stud4()],
// 1 16 20 4 0 1 0 0 0 -1 0 0 0 1 stud4.dat
  [1,16,20,4,0,1,0,0,0,-1,0,0,0,1, ldraw_lib__stud4()],
// 1 16 -20 4 0 1 0 0 0 -1 0 0 0 1 stud4.dat
  [1,16,-20,4,0,1,0,0,0,-1,0,0,0,1, ldraw_lib__stud4()],
];
module ldraw_lib__s__87079s01(step=0, col=false, unit=2/5, alt=false, line=0.2, solid=!$preview)
    makepoly(ldraw_lib__s__87079s01(), step=step, col=col, unit=unit, alt=alt, line=line, solid=solid);
ldraw_lib__s__87079s01(line=0.2);
// main file
use <../lib.scad>
use <s/87079s01.scad>
function ldraw_lib__87079pxf() = [
// 0 Tile  2 x  4 with Yellow and Red "DEFENDER", Figure with Stripes, Smoke and Fire Pattern
// 0 Name: 87079pxf.dat
// 0 Author: Evert-Jan Boer [ejboer]
// 0 !LDRAW_ORG Part UPDATE 2022-02
// 0 !LICENSE Licensed under CC BY 4.0 : see CAreadme.txt
// 
// 0 BFC CERTIFY CCW
  [0,"BFC","CERTIFY"],
  [0,"BFC","CCW"],
// 
// 0 !KEYWORDS Arcade Cabinet, Bricklink 87079pb0288, Dimensions, Midway
// 0 !KEYWORDS Rebrickable 87079pr0084, set 71235
// 
// 0 !HISTORY 2022-03-06 [PTadmin] Official Update 2022-02
// 
// 
// 1 16 0 0 0 1 0 0 0 1 0 0 0 1 s\87079s01.dat
  [1,16,0,0,0,1,0,0,0,1,0,0,0,1, ldraw_lib__s__87079s01()],
// 
// 4 16 38.5 0 18.5 40 0 20 -40 0 20 -38.5 0 18.5
  [4,16,38.5,0,18.5,40,0,20,-40,0,20,-38.5,0,18.5],
// 4 16 40 0 20 38.5 0 18.5 38.5 0 -18.5 40 0 -20
  [4,16,40,0,20,38.5,0,18.5,38.5,0,-18.5,40,0,-20],
// 4 16 -38.5 0 -18.5 -40 0 -20 40 0 -20 38.5 0 -18.5
  [4,16,-38.5,0,-18.5,-40,0,-20,40,0,-20,38.5,0,-18.5],
// 4 16 -38.5 0 18.5 -40 0 20 -40 0 -20 -38.5 0 -18.5
  [4,16,-38.5,0,18.5,-40,0,20,-40,0,-20,-38.5,0,-18.5],
// 
// 0 !TEXMAP START PLANAR -38.5 0 -18.5 -38.5 0 18.5 38.5 0 18.5 87079pxf.png
// 0 !: 4 0 -38.5 0 18.5 -38.5 0 -18.5 38.5 0 -18.5 38.5 0 18.5
// 0 !TEXMAP FALLBACK
// 0 // Needs Work: fallback pattern
// 4 0 38.5 0 -18.5 38.5 0 18.5 -38.5 0 18.5 -38.5 0 -18.5
  [4,0,38.5,0,-18.5,38.5,0,18.5,-38.5,0,18.5,-38.5,0,-18.5],
// 0 !TEXMAP END
];
module ldraw_lib__87079pxf(step=0, col=false, unit=2/5, alt=false, line=0.2, solid=!$preview)
    makepoly(ldraw_lib__87079pxf(), step=step, col=col, unit=unit, alt=alt, line=line, solid=solid);
ldraw_lib__87079pxf(line=0.2);
